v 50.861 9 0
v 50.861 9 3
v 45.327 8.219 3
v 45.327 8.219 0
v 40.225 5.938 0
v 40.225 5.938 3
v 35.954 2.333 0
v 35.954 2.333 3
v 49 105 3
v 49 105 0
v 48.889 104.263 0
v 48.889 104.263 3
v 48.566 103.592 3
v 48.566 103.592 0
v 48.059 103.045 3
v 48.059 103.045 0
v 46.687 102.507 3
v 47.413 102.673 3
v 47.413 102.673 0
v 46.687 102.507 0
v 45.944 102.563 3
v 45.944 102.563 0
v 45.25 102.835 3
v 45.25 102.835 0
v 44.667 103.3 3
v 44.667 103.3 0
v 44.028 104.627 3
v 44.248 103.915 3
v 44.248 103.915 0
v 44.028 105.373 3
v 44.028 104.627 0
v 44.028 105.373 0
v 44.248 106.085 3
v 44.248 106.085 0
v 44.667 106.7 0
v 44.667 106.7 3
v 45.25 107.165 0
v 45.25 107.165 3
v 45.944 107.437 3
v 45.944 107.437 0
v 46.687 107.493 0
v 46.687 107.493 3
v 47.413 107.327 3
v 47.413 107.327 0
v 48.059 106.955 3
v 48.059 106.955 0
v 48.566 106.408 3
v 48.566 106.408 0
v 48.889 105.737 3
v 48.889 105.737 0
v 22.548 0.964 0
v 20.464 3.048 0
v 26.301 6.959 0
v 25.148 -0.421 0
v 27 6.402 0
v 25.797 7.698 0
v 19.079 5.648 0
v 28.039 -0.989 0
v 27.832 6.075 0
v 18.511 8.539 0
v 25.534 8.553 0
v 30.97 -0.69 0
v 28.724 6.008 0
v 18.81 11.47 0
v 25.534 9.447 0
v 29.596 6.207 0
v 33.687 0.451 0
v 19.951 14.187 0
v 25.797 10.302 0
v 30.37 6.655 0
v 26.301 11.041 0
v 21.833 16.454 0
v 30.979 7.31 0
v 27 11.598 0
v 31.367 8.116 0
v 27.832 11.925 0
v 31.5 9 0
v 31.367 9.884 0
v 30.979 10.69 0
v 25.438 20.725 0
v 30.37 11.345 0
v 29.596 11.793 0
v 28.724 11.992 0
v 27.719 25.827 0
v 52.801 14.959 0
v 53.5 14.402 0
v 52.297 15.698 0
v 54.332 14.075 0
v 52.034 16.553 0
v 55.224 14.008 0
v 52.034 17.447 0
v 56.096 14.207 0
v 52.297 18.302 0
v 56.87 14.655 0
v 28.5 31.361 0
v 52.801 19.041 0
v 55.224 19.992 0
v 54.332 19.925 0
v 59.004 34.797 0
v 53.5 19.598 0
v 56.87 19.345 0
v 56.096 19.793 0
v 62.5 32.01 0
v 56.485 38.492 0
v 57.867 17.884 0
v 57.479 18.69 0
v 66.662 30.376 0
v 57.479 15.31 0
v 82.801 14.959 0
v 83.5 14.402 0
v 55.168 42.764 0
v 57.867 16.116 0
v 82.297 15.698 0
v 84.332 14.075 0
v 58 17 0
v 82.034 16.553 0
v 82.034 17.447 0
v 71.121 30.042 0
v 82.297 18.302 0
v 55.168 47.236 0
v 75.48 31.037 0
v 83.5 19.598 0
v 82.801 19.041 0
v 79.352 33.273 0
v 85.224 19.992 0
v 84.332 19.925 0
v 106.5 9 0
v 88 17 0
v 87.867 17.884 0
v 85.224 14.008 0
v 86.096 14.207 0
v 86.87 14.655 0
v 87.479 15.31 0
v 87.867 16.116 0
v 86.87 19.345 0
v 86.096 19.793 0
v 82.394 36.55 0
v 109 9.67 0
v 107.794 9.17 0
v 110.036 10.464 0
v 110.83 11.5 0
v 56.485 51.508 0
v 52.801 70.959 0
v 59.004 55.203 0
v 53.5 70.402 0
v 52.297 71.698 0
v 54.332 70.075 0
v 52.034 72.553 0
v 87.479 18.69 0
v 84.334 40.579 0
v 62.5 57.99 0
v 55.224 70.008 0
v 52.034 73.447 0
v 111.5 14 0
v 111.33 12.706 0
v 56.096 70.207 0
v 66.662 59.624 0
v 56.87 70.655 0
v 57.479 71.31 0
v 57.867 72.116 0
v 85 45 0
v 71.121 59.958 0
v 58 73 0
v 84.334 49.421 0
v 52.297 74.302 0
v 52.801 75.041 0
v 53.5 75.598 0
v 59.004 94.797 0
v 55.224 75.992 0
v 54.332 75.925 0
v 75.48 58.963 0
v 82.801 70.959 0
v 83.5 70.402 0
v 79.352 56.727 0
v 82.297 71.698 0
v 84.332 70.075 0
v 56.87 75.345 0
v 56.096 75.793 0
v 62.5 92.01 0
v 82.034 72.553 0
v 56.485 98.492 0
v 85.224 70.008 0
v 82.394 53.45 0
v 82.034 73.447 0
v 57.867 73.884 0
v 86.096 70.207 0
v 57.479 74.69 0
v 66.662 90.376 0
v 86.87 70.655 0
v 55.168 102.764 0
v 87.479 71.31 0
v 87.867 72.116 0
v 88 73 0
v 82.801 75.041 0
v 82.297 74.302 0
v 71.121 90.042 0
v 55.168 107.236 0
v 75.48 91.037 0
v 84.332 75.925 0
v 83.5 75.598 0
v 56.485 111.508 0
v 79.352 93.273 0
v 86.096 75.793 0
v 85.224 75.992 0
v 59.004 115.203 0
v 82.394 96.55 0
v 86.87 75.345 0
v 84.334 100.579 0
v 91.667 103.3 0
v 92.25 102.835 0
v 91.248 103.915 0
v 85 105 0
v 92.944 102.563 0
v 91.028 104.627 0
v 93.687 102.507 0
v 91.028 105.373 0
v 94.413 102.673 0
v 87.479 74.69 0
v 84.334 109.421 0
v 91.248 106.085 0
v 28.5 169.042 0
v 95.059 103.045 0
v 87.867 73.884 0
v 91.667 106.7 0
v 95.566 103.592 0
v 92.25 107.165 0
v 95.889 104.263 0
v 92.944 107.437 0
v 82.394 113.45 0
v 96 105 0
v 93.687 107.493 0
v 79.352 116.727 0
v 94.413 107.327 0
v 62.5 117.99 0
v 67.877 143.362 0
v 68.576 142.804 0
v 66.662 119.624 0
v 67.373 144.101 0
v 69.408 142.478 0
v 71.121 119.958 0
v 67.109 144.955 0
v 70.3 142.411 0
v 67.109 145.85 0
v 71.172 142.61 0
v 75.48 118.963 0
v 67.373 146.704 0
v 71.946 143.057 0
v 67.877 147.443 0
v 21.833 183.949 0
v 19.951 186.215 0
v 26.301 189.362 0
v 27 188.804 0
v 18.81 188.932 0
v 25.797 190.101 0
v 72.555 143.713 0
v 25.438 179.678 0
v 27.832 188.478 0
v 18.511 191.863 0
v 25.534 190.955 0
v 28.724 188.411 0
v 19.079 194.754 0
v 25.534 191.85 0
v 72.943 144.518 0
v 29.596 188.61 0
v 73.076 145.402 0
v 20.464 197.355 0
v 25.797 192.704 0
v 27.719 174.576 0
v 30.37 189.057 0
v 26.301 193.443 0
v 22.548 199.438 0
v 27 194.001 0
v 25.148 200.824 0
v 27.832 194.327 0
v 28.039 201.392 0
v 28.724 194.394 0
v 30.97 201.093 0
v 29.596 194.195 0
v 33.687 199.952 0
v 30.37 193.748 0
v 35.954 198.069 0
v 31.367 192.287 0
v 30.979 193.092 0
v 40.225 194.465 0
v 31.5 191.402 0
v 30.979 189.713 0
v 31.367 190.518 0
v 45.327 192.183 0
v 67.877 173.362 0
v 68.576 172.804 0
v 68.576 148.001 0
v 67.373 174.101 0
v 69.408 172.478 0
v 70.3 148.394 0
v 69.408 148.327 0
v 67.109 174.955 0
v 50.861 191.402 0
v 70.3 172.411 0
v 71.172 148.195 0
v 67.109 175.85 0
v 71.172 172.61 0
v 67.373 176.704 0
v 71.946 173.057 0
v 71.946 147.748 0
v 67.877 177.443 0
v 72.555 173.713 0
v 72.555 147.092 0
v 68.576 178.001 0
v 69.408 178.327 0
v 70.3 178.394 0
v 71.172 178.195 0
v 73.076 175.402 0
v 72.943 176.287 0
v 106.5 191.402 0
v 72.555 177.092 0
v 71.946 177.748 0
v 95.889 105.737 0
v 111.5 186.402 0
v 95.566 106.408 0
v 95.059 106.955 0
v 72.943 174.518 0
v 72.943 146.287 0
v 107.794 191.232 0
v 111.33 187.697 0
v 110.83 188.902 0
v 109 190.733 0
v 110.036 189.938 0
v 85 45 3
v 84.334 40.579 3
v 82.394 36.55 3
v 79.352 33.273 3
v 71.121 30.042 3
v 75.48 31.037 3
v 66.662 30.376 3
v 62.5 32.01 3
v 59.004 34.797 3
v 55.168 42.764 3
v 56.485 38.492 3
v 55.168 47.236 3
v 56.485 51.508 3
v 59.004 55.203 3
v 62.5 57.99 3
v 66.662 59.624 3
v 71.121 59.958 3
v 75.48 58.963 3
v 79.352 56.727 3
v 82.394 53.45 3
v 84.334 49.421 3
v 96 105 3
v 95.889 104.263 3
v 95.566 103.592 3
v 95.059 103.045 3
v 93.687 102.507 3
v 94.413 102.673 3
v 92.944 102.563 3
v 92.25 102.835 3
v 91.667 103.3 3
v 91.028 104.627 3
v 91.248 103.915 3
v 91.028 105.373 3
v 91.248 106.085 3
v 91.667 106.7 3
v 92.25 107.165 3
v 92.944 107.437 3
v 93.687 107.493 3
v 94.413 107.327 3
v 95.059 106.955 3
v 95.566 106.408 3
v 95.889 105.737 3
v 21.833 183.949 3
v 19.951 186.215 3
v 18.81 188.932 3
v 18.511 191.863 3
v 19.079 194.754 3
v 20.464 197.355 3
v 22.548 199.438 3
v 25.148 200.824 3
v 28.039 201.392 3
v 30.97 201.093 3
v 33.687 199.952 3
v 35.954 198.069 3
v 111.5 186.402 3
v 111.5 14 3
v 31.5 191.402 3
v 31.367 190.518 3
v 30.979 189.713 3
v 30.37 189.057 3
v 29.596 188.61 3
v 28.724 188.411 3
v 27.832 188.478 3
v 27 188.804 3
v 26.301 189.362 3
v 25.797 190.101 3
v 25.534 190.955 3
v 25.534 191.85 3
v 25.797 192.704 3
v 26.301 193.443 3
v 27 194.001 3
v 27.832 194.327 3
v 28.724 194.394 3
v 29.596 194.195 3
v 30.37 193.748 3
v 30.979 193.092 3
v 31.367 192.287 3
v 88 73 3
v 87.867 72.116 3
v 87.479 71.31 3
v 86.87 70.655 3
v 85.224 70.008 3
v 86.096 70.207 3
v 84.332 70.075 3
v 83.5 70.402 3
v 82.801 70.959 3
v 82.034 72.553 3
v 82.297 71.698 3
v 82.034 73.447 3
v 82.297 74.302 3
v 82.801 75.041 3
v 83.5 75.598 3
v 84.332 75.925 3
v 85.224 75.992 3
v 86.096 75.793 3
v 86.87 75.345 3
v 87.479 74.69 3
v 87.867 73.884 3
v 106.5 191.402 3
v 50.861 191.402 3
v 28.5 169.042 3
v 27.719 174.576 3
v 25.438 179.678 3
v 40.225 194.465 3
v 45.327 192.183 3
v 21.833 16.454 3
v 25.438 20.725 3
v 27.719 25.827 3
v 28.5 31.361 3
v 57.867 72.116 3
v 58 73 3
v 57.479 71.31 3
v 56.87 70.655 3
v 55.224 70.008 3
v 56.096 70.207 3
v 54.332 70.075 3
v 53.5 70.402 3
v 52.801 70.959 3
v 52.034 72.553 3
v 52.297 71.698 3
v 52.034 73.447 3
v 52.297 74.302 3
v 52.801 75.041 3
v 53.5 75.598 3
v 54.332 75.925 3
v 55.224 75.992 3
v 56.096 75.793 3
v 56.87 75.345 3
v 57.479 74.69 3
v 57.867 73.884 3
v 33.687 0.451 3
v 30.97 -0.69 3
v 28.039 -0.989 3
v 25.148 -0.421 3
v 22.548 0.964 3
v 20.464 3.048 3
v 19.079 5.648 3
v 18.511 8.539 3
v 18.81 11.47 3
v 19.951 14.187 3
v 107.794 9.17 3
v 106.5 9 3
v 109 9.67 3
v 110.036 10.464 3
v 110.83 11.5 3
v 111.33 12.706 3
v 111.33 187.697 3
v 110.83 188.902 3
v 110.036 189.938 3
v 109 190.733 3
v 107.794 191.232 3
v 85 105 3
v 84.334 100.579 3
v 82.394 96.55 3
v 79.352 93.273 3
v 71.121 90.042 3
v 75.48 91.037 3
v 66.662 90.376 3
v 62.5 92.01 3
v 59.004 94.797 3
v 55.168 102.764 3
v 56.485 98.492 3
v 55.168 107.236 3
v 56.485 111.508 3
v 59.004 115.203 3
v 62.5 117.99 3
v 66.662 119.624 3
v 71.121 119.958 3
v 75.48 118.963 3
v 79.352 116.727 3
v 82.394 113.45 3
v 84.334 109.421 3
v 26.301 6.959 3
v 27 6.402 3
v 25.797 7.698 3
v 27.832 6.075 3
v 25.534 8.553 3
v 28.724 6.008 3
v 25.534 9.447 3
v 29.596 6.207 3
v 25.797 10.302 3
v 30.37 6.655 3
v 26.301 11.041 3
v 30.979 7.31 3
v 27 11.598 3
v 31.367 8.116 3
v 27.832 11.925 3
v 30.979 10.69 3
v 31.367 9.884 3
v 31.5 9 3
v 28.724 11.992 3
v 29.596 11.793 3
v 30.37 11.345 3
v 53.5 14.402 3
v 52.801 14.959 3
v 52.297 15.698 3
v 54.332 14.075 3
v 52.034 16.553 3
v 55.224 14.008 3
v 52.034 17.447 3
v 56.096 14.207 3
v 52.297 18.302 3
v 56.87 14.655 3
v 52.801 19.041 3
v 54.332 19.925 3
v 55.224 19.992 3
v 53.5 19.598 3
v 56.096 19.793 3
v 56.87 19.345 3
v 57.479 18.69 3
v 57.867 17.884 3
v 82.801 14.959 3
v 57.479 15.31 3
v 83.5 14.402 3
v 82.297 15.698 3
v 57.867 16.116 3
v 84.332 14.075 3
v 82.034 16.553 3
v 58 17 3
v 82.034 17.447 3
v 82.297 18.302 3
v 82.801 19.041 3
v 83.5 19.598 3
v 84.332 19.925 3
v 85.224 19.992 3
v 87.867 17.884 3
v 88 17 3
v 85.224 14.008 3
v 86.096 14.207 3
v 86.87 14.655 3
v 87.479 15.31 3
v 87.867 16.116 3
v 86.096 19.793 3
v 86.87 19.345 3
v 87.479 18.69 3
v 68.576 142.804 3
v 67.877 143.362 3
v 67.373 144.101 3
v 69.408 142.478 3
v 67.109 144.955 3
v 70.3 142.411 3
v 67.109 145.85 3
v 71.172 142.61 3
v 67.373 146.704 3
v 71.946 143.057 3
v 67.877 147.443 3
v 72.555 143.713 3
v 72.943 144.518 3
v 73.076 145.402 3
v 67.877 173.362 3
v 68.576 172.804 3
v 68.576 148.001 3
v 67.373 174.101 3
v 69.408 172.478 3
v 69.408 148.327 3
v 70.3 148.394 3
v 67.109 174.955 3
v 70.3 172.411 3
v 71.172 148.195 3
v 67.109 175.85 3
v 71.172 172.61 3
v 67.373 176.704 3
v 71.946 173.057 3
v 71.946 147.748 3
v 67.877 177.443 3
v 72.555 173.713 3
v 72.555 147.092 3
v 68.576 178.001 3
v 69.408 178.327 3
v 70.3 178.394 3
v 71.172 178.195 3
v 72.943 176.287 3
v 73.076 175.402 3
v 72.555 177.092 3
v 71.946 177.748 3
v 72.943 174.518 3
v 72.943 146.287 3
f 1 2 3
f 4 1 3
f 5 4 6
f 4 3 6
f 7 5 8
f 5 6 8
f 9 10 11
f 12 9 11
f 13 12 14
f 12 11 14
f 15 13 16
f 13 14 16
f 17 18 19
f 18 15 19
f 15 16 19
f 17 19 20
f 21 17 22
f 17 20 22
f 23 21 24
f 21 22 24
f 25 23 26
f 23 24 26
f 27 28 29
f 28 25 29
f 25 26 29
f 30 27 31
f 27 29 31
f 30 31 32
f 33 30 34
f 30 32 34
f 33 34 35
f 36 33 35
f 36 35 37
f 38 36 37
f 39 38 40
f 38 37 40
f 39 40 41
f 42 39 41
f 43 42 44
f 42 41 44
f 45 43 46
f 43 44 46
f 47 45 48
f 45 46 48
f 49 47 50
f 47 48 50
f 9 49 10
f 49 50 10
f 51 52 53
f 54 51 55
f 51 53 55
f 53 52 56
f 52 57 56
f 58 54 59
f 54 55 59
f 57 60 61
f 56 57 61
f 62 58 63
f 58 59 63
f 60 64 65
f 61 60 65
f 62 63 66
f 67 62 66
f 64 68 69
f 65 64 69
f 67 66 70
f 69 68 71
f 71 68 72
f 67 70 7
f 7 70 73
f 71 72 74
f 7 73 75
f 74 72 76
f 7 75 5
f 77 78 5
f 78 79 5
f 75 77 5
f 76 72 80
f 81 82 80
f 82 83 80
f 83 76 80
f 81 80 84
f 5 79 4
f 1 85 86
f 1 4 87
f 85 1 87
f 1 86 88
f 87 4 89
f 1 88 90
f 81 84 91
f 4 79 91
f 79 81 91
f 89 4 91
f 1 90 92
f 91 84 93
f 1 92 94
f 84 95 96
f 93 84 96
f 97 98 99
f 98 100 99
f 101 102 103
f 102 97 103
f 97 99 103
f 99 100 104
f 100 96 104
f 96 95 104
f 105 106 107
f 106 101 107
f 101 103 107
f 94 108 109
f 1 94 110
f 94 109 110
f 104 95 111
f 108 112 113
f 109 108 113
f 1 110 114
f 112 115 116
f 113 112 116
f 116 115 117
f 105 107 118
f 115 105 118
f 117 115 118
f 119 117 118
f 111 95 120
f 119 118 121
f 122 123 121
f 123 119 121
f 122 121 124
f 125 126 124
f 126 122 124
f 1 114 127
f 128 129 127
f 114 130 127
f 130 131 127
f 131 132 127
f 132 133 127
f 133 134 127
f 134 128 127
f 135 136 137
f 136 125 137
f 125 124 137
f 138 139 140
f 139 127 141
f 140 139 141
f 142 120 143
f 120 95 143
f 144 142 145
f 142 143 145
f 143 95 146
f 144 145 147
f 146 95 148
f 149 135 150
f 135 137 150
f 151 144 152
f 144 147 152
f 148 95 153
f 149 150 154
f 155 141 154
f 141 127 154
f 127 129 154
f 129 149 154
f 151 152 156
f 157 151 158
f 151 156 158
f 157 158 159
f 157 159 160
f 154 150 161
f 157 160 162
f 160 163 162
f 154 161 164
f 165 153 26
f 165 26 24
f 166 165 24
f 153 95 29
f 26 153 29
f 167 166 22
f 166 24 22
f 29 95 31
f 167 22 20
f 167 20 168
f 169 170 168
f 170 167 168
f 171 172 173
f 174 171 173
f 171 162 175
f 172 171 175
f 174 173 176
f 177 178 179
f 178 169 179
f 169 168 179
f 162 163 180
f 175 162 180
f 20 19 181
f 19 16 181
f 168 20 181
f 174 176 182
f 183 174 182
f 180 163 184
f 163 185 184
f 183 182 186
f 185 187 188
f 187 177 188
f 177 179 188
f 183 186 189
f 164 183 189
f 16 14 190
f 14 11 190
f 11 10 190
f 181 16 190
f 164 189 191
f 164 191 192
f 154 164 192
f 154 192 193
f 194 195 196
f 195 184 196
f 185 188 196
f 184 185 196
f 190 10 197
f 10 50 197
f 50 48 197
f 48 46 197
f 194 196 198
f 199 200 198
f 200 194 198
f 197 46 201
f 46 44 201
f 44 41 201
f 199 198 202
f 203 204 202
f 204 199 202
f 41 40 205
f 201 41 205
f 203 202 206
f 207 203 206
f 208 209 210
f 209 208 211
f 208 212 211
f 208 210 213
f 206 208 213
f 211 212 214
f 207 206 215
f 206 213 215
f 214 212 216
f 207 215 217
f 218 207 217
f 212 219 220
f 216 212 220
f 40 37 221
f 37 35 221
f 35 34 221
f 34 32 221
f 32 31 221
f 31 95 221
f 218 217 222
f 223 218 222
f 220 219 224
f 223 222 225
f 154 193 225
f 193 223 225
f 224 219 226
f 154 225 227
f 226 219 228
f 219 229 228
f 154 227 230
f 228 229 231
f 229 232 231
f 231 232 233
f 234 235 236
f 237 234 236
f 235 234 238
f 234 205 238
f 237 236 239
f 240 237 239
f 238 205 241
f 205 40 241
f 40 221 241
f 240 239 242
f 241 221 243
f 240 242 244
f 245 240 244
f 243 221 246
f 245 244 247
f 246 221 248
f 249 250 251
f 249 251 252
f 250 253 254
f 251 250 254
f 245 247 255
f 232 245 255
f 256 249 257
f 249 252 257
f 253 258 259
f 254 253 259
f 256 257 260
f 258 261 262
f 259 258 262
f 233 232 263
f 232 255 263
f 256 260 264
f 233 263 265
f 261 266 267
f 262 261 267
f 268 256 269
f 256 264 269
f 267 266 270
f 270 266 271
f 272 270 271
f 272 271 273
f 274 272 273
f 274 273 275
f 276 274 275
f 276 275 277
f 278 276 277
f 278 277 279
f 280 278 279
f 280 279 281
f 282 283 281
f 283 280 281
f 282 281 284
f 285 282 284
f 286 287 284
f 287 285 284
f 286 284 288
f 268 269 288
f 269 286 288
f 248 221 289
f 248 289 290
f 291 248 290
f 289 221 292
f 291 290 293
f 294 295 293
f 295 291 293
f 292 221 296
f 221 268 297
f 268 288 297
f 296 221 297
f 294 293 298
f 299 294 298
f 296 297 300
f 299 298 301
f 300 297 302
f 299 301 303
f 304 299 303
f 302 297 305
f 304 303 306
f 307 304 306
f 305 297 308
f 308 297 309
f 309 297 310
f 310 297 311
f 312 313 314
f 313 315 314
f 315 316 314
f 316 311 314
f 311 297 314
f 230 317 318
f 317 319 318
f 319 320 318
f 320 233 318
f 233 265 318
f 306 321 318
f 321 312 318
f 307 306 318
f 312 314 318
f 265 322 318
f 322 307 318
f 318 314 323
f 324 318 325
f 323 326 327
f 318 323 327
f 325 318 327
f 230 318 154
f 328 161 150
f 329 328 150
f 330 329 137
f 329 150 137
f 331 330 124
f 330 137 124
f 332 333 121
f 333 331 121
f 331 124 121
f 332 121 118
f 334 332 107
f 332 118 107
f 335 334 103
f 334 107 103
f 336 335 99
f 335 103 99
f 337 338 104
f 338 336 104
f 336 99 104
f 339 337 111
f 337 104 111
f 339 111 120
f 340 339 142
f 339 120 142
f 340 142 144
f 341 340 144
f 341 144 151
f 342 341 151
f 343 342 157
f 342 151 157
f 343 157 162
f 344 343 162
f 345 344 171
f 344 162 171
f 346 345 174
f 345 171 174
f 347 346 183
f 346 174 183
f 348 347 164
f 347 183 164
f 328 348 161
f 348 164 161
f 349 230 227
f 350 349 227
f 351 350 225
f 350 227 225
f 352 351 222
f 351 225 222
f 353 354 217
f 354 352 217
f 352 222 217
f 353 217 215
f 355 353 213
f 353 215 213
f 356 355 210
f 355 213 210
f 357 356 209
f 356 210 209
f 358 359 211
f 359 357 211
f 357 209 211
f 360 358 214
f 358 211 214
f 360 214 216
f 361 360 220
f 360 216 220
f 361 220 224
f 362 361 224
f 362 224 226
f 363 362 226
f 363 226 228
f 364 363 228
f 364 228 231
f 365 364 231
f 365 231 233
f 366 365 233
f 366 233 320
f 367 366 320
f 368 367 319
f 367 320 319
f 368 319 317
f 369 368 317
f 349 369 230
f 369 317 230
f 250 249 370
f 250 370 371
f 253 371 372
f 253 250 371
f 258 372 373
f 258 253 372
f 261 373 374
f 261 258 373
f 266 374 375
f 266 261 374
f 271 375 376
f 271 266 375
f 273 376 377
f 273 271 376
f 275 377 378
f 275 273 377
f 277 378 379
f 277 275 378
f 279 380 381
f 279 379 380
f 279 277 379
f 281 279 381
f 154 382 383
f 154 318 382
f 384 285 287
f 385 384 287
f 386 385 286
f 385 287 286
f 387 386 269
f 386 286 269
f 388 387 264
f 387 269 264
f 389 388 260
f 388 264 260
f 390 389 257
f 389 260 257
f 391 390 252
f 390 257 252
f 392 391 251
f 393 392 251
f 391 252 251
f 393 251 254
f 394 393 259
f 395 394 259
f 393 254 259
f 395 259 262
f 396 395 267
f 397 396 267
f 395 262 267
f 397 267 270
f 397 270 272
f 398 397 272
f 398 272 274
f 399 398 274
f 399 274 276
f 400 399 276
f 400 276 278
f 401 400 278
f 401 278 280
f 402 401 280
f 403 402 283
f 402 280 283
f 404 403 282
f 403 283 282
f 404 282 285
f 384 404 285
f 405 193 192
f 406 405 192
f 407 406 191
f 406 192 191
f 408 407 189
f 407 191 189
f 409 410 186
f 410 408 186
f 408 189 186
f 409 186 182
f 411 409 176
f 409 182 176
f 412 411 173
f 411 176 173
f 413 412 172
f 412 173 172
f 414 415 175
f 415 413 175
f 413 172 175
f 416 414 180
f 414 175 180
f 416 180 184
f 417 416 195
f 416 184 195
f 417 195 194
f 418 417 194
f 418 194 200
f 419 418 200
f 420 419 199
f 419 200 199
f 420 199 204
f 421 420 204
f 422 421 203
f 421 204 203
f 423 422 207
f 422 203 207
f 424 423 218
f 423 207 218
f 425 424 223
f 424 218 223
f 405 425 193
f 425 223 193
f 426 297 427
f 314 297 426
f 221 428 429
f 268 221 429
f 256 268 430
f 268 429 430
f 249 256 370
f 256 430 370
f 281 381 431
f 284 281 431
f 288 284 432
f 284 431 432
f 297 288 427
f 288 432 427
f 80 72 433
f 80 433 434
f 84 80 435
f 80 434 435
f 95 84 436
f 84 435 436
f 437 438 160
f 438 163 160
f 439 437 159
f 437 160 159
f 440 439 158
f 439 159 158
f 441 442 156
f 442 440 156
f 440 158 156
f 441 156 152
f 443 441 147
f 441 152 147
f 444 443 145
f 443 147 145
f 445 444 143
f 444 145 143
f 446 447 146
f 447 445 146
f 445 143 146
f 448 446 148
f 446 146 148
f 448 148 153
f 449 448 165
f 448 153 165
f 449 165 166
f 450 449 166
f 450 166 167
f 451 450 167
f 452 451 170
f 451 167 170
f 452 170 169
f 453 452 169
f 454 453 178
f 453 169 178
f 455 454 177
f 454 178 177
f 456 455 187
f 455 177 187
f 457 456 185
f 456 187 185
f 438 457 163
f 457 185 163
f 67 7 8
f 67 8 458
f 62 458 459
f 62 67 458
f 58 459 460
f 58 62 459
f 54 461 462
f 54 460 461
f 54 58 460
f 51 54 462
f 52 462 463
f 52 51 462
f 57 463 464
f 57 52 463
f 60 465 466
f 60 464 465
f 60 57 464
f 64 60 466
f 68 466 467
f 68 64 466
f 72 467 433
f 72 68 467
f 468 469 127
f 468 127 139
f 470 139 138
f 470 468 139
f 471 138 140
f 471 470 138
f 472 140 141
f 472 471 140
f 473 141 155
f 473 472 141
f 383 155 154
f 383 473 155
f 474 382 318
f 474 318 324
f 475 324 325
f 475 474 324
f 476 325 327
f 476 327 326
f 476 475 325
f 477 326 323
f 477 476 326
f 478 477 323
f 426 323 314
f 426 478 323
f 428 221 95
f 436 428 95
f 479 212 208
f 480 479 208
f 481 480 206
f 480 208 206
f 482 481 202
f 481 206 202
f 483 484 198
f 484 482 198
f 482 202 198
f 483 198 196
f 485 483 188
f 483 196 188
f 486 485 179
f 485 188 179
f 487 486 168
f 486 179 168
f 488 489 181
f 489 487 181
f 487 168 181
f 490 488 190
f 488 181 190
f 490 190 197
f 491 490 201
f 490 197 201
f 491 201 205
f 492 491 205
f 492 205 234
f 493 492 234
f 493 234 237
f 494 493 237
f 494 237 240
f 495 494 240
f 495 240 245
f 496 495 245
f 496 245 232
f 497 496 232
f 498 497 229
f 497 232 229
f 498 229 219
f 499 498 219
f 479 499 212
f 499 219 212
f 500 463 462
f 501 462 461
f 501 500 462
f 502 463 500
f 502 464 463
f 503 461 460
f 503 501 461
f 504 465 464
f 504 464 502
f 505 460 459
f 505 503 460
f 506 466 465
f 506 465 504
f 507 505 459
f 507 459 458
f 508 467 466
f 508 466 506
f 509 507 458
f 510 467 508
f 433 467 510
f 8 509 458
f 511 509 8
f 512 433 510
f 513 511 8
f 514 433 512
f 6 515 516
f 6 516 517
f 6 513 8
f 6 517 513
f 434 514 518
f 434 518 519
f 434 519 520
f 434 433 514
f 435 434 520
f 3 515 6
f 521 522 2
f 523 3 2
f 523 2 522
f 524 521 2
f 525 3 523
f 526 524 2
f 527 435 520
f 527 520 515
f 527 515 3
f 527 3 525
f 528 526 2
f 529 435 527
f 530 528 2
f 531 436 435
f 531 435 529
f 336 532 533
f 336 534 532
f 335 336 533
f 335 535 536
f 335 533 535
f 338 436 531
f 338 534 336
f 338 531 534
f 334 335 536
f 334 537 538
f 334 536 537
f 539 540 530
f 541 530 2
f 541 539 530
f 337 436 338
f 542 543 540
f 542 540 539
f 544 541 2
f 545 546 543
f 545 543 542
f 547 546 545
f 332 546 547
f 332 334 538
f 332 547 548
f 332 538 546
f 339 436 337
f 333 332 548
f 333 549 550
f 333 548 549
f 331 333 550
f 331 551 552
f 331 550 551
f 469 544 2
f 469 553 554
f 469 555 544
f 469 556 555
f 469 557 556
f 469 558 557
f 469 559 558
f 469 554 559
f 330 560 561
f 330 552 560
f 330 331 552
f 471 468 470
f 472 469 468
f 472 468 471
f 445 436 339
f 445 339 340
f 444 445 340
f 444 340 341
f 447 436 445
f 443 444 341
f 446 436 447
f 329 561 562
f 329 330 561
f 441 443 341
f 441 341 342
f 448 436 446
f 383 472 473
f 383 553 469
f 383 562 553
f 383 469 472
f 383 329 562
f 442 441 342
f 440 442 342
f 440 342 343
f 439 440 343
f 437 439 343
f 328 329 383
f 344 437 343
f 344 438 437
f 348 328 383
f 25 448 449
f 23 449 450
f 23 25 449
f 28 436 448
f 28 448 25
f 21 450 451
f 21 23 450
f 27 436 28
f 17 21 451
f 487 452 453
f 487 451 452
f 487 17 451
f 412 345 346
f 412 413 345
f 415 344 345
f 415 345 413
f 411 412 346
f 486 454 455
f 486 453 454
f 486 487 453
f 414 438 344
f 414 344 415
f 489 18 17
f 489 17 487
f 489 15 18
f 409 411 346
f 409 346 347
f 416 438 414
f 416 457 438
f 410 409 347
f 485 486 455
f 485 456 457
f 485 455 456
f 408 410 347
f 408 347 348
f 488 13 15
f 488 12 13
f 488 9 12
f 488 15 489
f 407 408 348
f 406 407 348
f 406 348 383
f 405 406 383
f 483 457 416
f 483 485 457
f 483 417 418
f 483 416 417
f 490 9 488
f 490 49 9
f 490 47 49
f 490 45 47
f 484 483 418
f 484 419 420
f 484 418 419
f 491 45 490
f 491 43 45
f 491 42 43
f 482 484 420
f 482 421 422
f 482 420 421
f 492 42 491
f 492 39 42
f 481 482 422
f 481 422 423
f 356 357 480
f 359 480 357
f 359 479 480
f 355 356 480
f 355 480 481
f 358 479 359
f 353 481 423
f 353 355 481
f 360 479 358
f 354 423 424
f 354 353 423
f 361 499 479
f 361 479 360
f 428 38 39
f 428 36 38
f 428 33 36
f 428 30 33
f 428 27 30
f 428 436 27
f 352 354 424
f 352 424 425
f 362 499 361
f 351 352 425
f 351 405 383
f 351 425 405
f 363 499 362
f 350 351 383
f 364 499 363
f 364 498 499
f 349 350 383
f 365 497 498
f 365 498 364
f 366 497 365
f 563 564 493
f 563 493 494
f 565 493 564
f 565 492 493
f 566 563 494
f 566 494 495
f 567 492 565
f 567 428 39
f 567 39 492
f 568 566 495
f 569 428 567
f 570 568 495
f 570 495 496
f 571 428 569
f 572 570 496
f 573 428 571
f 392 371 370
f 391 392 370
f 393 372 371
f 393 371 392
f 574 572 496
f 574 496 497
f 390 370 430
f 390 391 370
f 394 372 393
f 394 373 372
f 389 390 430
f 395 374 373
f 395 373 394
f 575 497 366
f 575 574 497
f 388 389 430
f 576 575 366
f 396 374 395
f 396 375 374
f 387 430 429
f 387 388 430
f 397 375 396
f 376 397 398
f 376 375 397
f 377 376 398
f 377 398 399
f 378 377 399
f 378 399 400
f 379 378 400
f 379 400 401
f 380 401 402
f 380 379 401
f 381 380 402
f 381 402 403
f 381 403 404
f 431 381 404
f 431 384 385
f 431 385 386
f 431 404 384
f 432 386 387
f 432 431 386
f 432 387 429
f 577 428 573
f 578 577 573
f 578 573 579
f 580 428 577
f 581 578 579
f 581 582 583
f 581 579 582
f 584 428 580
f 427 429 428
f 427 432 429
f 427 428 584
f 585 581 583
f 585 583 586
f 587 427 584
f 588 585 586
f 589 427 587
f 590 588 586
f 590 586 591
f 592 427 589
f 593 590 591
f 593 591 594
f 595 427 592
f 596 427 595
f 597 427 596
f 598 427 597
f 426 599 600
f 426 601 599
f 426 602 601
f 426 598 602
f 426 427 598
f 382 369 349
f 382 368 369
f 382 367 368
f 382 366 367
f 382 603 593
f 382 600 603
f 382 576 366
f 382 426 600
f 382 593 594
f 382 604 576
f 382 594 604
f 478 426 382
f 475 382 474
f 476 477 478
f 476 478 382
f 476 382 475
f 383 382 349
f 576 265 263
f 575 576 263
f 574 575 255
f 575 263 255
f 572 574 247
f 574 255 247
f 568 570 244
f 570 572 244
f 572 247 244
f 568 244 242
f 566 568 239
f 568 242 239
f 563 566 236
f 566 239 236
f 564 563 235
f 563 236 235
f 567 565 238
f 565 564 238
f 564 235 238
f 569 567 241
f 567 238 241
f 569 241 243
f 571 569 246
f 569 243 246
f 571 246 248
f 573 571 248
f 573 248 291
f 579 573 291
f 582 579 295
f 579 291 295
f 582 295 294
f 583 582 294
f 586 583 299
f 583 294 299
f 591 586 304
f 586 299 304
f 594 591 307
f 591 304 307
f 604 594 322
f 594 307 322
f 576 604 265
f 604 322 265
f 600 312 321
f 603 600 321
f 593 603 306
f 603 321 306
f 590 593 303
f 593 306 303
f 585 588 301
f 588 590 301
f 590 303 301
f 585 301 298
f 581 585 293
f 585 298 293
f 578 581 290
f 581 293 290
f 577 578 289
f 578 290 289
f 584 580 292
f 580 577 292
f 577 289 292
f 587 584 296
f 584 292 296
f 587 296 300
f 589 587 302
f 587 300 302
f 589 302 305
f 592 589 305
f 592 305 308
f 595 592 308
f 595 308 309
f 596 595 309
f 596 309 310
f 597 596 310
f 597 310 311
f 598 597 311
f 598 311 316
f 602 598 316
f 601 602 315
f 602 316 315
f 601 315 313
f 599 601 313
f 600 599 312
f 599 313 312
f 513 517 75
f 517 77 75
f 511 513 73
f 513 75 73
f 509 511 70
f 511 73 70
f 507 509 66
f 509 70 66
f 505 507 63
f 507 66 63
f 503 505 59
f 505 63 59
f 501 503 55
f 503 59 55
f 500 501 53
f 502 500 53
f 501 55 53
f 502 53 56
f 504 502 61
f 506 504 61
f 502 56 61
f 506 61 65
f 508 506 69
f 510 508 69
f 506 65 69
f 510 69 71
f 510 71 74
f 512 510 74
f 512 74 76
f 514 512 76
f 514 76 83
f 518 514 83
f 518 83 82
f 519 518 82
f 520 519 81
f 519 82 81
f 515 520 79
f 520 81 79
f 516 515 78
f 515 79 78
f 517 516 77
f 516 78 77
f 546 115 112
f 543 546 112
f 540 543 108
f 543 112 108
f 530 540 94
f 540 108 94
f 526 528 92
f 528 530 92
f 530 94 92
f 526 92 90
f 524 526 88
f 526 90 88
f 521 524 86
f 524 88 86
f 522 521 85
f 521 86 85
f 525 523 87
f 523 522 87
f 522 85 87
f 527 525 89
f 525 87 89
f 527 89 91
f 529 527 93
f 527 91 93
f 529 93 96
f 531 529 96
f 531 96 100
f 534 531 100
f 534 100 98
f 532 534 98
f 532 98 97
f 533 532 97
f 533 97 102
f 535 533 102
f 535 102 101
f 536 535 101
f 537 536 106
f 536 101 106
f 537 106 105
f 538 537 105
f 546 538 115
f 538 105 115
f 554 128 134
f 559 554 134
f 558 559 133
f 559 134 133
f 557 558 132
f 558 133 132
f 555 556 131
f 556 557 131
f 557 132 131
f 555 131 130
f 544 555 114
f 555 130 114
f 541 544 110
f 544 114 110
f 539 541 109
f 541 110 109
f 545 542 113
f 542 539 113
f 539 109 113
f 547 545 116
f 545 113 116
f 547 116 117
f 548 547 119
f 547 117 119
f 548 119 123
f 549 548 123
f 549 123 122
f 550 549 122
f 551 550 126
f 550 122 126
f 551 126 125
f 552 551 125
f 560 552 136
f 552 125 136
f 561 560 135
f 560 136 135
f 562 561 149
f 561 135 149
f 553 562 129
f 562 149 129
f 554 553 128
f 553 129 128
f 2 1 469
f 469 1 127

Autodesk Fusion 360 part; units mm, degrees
sketch "Sketch1" plane through (0, 0, 0) normal (0, 0, 1) x (1, 0, 0)
  line L0 (99.5, 80) -> (40.5, 80)
  line L1 (40.5, 80) -> (40.5, 10)
  line L2 (40.5, 10) -> (99.5, 10)
  line L3 (99.5, 10) -> (99.5, 80)
  line L4 (99.5, 80) -> (40.5, 10) construction
  line L5 (40.5, 80) -> (99.5, 10) construction
  line L6 (40.5, 73) -> (100, 73) construction
  line L7 (70, 45) -> (70, 80) construction
  circle A0 centre (55, 73) radius 3
  circle A1 centre (85, 73) radius 3
  line L8 (70, 45) -> (40, 45) construction
  circle A2 centre (55, 17) radius 3
  circle A3 centre (85, 17) radius 3
  circle A4 centre (70, 45) radius 15
  line L9 (101.5, 127.5) -> (38.5, 82.5) construction
  line L10 (101.5, 82.5) -> (38.5, 127.5) construction
  line L11 (101.5, 127.5) -> (38.5, 127.5)
  line L12 (101.5, 82.5) -> (101.5, 127.5)
  line L13 (38.5, 82.5) -> (101.5, 82.5)
  line L14 (38.5, 127.5) -> (38.5, 82.5)
  circle A5 centre (46.5, 105) radius 2.5
  circle A6 centre (70, 105) radius 15
  circle A7 centre (93.5, 105) radius 2.5
  line L15 (70, 80) -> (70, 120) construction
  line L16 (45.0759, 190.4025) -> (95.0759, 190.4025)
  line L17 (95.0759, 190.4025) -> (95.0759, 130.4025)
  line L18 (95.0759, 130.4025) -> (45.0759, 130.4025)
  line L19 (45.0759, 130.4025) -> (45.0759, 190.4025)
  line L20 (70.0759, 190.4025) -> (70.0759, 130.4025) construction
  line L21 (70.0759, 160.4025) -> (95.0759, 160.4025) construction
  circle A8 centre (70.0759, 175.4025) radius 3
  circle A9 centre (70.0759, 145.4025) radius 3
  line L22 (28.5, 191.4025) -> (28.5, 9)
  line L23 (111.5, 191.4025) -> (111.5, 9)
  line L24 (28.5, 191.4025) -> (111.5, 191.4025)
  line L25 (28.5, 9) -> (111.5, 9)
  circle A10 centre (28.5, 191.4025) radius 3
  circle A11 centre (28.5, 191.4025) radius 10
  circle A12 centre (28.5, 9) radius 3
  circle A13 centre (28.5, 9) radius 10
  point P0 (70, 45)
  dimension "d1" = 59
  dimension "d2" = 70
  dimension "d3" = 7
  dimension "d5" = 6
  dimension "d6" = 15
  dimension "d7" = 30
  dimension "d8" = 45
  dimension "d9" = 63
  dimension "d10" = 5
  dimension "d11" = 30
  dimension "d12" = 50
  dimension "d13" = 60
  dimension "d14" = 6
  dimension "d15" = 15
  dimension "d16" = 10
  dimension "d17" = 10
  dimension "d18" = 1
  dimension "d19" = 1
  dimension "d22" = 6
  dimension "d23" = 20
  dimension "d24" = 6
  dimension "d25" = 20
extrude "Extrude1" add sketch "Sketch1" along normal blind 3 contours L0 L1 L2 L3 | L11 L12 L13 L14 | L16 L17 L18 L19 | L22 L24 A10 A11 | L22 L24 A10 A11 | L22 L23 L24 L25 A11 A13 | L22 L25 A12 A13 | L22 L25 A12 A13
fillet "Fillet1" radius 20 2 edges at (38.5, 191.4025, 1.5) (28.5, 181.4025, 1.5)
fillet "Fillet2" radius 20 2 edges at (38.5, 9, 1.5) (28.5, 19, 1.5)
fillet "Fillet3" radius 5 2 edges at (111.5, 191.4025, 1.5) (111.5, 9, 1.5)
equation "d17 = d16"
